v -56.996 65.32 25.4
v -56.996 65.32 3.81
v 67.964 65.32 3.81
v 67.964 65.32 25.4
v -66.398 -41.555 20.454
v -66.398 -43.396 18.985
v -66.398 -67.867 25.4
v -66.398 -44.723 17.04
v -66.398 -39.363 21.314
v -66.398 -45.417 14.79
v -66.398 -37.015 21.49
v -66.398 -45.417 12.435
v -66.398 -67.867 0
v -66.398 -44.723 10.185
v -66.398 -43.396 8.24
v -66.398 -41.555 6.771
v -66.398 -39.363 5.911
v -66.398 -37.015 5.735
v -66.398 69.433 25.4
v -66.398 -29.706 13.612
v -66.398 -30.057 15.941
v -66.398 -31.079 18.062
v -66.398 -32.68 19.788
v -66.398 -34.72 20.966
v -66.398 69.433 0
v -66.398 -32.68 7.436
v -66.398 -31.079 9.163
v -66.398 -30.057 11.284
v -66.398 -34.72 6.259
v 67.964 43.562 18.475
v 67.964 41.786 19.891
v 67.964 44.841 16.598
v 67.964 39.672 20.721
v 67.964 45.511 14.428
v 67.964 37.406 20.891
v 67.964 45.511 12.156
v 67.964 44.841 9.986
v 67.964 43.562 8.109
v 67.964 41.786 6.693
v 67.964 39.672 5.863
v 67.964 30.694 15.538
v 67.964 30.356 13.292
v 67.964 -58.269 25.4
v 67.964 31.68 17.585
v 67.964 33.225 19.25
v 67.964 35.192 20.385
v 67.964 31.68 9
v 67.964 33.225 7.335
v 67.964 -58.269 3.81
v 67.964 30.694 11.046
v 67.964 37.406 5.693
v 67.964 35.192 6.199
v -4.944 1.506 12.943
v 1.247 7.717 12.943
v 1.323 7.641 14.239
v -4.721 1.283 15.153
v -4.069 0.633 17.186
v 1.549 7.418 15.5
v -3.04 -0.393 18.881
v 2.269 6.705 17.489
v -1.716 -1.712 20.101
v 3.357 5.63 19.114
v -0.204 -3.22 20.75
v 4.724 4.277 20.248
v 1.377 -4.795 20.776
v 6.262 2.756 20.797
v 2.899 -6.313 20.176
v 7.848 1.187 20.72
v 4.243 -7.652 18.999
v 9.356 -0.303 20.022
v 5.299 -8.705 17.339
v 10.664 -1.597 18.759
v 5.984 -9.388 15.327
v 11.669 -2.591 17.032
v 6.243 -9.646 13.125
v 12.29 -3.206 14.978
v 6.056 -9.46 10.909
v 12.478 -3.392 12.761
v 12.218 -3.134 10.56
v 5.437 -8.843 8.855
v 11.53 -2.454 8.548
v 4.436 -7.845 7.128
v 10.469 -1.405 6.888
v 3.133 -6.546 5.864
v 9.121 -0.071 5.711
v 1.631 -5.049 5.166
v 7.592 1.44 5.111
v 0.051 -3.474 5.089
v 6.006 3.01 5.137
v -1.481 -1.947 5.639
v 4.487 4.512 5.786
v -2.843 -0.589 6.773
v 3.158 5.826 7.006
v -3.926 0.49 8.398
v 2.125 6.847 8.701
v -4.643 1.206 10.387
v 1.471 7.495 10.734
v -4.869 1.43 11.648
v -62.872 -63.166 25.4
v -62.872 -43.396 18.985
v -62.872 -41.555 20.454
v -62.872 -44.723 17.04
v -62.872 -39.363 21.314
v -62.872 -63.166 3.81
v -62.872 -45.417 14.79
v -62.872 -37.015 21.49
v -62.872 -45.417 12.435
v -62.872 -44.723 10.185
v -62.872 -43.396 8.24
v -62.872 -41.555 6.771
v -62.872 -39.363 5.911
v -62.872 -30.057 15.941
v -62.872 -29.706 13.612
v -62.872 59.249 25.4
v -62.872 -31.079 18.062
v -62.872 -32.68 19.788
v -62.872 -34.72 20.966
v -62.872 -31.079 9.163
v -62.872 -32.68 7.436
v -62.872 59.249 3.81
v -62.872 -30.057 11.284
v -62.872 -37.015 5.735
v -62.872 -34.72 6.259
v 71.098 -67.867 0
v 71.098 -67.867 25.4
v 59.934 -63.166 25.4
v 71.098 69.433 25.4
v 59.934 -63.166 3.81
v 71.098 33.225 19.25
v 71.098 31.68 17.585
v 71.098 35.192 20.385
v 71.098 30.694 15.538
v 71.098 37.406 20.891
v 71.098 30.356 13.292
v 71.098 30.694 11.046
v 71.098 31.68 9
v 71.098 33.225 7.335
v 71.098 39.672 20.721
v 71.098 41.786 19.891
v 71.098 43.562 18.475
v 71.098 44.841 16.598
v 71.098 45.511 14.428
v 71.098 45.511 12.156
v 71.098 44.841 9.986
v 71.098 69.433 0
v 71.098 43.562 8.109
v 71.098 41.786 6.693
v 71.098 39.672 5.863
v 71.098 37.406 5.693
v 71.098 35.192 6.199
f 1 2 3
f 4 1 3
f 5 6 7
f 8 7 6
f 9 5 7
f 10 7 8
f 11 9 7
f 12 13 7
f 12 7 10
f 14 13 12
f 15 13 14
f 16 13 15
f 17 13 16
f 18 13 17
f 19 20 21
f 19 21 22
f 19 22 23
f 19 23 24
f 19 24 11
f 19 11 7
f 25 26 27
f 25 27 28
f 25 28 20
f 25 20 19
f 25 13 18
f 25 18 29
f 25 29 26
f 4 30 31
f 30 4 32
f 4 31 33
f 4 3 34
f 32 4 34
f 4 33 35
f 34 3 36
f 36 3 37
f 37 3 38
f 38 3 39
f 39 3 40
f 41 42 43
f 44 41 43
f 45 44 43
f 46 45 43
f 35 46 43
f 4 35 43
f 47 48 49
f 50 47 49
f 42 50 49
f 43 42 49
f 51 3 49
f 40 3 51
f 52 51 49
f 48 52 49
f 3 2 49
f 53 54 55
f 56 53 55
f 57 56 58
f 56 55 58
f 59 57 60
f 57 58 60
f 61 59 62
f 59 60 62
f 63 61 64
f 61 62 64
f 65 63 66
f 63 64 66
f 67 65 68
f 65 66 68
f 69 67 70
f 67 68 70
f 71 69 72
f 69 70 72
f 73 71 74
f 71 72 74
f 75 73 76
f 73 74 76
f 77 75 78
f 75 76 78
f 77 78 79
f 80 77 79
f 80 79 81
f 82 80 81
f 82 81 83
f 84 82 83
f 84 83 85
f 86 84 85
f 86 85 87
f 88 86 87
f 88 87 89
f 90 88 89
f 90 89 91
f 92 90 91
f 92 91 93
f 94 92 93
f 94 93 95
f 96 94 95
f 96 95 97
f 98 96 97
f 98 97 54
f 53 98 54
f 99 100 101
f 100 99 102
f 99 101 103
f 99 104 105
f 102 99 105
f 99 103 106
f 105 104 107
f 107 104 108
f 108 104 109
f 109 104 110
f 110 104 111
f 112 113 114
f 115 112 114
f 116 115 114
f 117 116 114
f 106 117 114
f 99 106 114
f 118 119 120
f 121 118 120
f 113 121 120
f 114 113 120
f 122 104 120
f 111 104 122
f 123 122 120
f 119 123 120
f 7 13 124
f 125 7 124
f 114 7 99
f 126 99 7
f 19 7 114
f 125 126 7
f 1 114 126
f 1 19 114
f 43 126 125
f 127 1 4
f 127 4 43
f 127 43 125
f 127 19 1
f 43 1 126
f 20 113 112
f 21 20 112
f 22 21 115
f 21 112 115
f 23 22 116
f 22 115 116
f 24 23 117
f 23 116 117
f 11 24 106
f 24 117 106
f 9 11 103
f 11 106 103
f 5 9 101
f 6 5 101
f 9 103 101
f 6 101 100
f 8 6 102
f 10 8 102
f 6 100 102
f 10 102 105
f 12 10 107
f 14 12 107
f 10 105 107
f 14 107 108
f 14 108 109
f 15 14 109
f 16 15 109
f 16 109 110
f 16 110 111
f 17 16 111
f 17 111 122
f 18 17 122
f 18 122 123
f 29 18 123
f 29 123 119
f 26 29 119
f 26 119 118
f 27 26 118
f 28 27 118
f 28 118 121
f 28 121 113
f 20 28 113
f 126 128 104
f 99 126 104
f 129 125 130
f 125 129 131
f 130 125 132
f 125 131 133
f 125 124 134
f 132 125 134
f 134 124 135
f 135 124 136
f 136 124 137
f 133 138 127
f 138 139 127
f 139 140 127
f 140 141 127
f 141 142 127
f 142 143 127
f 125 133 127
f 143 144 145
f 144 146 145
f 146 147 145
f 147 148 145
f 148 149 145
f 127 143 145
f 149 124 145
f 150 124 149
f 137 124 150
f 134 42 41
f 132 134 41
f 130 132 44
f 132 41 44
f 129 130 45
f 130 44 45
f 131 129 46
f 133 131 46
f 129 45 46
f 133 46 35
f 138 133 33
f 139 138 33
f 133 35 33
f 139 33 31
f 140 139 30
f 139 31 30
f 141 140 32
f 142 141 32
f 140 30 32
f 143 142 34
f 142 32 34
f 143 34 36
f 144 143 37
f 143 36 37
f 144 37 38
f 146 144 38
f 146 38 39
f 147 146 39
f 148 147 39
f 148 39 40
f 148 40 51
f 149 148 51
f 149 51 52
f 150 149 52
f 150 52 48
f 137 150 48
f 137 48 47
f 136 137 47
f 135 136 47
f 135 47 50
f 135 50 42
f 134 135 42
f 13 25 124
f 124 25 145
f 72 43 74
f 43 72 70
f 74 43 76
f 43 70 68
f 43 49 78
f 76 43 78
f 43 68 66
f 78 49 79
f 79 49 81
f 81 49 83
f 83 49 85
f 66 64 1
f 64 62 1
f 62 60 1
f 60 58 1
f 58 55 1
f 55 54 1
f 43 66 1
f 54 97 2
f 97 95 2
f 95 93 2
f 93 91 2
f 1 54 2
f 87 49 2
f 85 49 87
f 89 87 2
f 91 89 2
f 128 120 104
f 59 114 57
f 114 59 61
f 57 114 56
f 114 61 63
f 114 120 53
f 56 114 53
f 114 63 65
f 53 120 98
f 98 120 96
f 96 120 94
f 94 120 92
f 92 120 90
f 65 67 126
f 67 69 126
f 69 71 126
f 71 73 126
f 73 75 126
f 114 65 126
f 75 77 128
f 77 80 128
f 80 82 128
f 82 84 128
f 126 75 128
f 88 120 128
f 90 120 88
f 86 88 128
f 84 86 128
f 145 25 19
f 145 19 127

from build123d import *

# Parameters (mm, degrees)
F0_W     = 137.495763
F0_H     = 137.29991
F1_DEPTH = 25.4
F2_DEPTH = 3.81
F3_DEPTH = 3.81
F5_D     = 15.24
F5_DEPTH = 12.7
F7_D     = 15.7988
F7_DEPTH = 12.7
F9_D     = 15.7988
F9_DEPTH = 12.7


with BuildPart() as f1:
    # F0 (on Top) → F1 (new body)
    with BuildSketch(Plane.XY):
        with Locations((2.350356, 0.783451)):
            Rectangle(F0_W, F0_H)
        Polygon((-62.872, 59.248533), (-62.872, 65.320283), (-56.996111, 65.320283), (67.964435, 65.320283), (67.964435, -58.269218), (67.964435, -63.165791), (59.93405, -63.165791), (-62.872, -63.165791), align=None, mode=Mode.SUBTRACT)
        Polygon((-56.996111, 65.320283), (-62.872, 65.320283), (-62.872, 59.248533), (59.93405, -63.165791), (67.964435, -63.165791), (67.964435, -58.269218), align=None)
    extrude(amount=F1_DEPTH)

    # F0 (on Top) → F2 (join)
    with BuildSketch(Plane.XY):
        Polygon((67.964435, 65.320283), (-56.996111, 65.320283), (67.964435, -58.269218), align=None)
    extrude(amount=F2_DEPTH)

    # F0 (on Top) → F3 (join)
    with BuildSketch(Plane.XY):
        Polygon((59.93405, -63.165791), (-62.872, 59.248533), (-62.872, -63.165791), align=None)
    extrude(amount=F3_DEPTH)

    # F5
    with Locations(Plane.YZ.offset(71.098238)):
        with Locations((37.975904, 13.292117)):
            Hole(F5_D / 2, depth=F5_DEPTH)

    # F7
    with Locations(Plane(origin=(-66.397525, 0, 0), x_dir=(0, -1, 0), z_dir=(-1, 0, 0))):
        with Locations((37.605681, 13.612472)):
            Hole(F7_D / 2, depth=F7_DEPTH)

    # F9
    with Locations(Plane(origin=(-1.711451, -1.716927, 0), x_dir=(0.708235, -0.705976, 0), z_dir=(-0.705976, -0.708235, 0))):
        with Locations((3.334498, 12.943435)):
            Hole(F9_D / 2, depth=F9_DEPTH)


solid = f1.part
